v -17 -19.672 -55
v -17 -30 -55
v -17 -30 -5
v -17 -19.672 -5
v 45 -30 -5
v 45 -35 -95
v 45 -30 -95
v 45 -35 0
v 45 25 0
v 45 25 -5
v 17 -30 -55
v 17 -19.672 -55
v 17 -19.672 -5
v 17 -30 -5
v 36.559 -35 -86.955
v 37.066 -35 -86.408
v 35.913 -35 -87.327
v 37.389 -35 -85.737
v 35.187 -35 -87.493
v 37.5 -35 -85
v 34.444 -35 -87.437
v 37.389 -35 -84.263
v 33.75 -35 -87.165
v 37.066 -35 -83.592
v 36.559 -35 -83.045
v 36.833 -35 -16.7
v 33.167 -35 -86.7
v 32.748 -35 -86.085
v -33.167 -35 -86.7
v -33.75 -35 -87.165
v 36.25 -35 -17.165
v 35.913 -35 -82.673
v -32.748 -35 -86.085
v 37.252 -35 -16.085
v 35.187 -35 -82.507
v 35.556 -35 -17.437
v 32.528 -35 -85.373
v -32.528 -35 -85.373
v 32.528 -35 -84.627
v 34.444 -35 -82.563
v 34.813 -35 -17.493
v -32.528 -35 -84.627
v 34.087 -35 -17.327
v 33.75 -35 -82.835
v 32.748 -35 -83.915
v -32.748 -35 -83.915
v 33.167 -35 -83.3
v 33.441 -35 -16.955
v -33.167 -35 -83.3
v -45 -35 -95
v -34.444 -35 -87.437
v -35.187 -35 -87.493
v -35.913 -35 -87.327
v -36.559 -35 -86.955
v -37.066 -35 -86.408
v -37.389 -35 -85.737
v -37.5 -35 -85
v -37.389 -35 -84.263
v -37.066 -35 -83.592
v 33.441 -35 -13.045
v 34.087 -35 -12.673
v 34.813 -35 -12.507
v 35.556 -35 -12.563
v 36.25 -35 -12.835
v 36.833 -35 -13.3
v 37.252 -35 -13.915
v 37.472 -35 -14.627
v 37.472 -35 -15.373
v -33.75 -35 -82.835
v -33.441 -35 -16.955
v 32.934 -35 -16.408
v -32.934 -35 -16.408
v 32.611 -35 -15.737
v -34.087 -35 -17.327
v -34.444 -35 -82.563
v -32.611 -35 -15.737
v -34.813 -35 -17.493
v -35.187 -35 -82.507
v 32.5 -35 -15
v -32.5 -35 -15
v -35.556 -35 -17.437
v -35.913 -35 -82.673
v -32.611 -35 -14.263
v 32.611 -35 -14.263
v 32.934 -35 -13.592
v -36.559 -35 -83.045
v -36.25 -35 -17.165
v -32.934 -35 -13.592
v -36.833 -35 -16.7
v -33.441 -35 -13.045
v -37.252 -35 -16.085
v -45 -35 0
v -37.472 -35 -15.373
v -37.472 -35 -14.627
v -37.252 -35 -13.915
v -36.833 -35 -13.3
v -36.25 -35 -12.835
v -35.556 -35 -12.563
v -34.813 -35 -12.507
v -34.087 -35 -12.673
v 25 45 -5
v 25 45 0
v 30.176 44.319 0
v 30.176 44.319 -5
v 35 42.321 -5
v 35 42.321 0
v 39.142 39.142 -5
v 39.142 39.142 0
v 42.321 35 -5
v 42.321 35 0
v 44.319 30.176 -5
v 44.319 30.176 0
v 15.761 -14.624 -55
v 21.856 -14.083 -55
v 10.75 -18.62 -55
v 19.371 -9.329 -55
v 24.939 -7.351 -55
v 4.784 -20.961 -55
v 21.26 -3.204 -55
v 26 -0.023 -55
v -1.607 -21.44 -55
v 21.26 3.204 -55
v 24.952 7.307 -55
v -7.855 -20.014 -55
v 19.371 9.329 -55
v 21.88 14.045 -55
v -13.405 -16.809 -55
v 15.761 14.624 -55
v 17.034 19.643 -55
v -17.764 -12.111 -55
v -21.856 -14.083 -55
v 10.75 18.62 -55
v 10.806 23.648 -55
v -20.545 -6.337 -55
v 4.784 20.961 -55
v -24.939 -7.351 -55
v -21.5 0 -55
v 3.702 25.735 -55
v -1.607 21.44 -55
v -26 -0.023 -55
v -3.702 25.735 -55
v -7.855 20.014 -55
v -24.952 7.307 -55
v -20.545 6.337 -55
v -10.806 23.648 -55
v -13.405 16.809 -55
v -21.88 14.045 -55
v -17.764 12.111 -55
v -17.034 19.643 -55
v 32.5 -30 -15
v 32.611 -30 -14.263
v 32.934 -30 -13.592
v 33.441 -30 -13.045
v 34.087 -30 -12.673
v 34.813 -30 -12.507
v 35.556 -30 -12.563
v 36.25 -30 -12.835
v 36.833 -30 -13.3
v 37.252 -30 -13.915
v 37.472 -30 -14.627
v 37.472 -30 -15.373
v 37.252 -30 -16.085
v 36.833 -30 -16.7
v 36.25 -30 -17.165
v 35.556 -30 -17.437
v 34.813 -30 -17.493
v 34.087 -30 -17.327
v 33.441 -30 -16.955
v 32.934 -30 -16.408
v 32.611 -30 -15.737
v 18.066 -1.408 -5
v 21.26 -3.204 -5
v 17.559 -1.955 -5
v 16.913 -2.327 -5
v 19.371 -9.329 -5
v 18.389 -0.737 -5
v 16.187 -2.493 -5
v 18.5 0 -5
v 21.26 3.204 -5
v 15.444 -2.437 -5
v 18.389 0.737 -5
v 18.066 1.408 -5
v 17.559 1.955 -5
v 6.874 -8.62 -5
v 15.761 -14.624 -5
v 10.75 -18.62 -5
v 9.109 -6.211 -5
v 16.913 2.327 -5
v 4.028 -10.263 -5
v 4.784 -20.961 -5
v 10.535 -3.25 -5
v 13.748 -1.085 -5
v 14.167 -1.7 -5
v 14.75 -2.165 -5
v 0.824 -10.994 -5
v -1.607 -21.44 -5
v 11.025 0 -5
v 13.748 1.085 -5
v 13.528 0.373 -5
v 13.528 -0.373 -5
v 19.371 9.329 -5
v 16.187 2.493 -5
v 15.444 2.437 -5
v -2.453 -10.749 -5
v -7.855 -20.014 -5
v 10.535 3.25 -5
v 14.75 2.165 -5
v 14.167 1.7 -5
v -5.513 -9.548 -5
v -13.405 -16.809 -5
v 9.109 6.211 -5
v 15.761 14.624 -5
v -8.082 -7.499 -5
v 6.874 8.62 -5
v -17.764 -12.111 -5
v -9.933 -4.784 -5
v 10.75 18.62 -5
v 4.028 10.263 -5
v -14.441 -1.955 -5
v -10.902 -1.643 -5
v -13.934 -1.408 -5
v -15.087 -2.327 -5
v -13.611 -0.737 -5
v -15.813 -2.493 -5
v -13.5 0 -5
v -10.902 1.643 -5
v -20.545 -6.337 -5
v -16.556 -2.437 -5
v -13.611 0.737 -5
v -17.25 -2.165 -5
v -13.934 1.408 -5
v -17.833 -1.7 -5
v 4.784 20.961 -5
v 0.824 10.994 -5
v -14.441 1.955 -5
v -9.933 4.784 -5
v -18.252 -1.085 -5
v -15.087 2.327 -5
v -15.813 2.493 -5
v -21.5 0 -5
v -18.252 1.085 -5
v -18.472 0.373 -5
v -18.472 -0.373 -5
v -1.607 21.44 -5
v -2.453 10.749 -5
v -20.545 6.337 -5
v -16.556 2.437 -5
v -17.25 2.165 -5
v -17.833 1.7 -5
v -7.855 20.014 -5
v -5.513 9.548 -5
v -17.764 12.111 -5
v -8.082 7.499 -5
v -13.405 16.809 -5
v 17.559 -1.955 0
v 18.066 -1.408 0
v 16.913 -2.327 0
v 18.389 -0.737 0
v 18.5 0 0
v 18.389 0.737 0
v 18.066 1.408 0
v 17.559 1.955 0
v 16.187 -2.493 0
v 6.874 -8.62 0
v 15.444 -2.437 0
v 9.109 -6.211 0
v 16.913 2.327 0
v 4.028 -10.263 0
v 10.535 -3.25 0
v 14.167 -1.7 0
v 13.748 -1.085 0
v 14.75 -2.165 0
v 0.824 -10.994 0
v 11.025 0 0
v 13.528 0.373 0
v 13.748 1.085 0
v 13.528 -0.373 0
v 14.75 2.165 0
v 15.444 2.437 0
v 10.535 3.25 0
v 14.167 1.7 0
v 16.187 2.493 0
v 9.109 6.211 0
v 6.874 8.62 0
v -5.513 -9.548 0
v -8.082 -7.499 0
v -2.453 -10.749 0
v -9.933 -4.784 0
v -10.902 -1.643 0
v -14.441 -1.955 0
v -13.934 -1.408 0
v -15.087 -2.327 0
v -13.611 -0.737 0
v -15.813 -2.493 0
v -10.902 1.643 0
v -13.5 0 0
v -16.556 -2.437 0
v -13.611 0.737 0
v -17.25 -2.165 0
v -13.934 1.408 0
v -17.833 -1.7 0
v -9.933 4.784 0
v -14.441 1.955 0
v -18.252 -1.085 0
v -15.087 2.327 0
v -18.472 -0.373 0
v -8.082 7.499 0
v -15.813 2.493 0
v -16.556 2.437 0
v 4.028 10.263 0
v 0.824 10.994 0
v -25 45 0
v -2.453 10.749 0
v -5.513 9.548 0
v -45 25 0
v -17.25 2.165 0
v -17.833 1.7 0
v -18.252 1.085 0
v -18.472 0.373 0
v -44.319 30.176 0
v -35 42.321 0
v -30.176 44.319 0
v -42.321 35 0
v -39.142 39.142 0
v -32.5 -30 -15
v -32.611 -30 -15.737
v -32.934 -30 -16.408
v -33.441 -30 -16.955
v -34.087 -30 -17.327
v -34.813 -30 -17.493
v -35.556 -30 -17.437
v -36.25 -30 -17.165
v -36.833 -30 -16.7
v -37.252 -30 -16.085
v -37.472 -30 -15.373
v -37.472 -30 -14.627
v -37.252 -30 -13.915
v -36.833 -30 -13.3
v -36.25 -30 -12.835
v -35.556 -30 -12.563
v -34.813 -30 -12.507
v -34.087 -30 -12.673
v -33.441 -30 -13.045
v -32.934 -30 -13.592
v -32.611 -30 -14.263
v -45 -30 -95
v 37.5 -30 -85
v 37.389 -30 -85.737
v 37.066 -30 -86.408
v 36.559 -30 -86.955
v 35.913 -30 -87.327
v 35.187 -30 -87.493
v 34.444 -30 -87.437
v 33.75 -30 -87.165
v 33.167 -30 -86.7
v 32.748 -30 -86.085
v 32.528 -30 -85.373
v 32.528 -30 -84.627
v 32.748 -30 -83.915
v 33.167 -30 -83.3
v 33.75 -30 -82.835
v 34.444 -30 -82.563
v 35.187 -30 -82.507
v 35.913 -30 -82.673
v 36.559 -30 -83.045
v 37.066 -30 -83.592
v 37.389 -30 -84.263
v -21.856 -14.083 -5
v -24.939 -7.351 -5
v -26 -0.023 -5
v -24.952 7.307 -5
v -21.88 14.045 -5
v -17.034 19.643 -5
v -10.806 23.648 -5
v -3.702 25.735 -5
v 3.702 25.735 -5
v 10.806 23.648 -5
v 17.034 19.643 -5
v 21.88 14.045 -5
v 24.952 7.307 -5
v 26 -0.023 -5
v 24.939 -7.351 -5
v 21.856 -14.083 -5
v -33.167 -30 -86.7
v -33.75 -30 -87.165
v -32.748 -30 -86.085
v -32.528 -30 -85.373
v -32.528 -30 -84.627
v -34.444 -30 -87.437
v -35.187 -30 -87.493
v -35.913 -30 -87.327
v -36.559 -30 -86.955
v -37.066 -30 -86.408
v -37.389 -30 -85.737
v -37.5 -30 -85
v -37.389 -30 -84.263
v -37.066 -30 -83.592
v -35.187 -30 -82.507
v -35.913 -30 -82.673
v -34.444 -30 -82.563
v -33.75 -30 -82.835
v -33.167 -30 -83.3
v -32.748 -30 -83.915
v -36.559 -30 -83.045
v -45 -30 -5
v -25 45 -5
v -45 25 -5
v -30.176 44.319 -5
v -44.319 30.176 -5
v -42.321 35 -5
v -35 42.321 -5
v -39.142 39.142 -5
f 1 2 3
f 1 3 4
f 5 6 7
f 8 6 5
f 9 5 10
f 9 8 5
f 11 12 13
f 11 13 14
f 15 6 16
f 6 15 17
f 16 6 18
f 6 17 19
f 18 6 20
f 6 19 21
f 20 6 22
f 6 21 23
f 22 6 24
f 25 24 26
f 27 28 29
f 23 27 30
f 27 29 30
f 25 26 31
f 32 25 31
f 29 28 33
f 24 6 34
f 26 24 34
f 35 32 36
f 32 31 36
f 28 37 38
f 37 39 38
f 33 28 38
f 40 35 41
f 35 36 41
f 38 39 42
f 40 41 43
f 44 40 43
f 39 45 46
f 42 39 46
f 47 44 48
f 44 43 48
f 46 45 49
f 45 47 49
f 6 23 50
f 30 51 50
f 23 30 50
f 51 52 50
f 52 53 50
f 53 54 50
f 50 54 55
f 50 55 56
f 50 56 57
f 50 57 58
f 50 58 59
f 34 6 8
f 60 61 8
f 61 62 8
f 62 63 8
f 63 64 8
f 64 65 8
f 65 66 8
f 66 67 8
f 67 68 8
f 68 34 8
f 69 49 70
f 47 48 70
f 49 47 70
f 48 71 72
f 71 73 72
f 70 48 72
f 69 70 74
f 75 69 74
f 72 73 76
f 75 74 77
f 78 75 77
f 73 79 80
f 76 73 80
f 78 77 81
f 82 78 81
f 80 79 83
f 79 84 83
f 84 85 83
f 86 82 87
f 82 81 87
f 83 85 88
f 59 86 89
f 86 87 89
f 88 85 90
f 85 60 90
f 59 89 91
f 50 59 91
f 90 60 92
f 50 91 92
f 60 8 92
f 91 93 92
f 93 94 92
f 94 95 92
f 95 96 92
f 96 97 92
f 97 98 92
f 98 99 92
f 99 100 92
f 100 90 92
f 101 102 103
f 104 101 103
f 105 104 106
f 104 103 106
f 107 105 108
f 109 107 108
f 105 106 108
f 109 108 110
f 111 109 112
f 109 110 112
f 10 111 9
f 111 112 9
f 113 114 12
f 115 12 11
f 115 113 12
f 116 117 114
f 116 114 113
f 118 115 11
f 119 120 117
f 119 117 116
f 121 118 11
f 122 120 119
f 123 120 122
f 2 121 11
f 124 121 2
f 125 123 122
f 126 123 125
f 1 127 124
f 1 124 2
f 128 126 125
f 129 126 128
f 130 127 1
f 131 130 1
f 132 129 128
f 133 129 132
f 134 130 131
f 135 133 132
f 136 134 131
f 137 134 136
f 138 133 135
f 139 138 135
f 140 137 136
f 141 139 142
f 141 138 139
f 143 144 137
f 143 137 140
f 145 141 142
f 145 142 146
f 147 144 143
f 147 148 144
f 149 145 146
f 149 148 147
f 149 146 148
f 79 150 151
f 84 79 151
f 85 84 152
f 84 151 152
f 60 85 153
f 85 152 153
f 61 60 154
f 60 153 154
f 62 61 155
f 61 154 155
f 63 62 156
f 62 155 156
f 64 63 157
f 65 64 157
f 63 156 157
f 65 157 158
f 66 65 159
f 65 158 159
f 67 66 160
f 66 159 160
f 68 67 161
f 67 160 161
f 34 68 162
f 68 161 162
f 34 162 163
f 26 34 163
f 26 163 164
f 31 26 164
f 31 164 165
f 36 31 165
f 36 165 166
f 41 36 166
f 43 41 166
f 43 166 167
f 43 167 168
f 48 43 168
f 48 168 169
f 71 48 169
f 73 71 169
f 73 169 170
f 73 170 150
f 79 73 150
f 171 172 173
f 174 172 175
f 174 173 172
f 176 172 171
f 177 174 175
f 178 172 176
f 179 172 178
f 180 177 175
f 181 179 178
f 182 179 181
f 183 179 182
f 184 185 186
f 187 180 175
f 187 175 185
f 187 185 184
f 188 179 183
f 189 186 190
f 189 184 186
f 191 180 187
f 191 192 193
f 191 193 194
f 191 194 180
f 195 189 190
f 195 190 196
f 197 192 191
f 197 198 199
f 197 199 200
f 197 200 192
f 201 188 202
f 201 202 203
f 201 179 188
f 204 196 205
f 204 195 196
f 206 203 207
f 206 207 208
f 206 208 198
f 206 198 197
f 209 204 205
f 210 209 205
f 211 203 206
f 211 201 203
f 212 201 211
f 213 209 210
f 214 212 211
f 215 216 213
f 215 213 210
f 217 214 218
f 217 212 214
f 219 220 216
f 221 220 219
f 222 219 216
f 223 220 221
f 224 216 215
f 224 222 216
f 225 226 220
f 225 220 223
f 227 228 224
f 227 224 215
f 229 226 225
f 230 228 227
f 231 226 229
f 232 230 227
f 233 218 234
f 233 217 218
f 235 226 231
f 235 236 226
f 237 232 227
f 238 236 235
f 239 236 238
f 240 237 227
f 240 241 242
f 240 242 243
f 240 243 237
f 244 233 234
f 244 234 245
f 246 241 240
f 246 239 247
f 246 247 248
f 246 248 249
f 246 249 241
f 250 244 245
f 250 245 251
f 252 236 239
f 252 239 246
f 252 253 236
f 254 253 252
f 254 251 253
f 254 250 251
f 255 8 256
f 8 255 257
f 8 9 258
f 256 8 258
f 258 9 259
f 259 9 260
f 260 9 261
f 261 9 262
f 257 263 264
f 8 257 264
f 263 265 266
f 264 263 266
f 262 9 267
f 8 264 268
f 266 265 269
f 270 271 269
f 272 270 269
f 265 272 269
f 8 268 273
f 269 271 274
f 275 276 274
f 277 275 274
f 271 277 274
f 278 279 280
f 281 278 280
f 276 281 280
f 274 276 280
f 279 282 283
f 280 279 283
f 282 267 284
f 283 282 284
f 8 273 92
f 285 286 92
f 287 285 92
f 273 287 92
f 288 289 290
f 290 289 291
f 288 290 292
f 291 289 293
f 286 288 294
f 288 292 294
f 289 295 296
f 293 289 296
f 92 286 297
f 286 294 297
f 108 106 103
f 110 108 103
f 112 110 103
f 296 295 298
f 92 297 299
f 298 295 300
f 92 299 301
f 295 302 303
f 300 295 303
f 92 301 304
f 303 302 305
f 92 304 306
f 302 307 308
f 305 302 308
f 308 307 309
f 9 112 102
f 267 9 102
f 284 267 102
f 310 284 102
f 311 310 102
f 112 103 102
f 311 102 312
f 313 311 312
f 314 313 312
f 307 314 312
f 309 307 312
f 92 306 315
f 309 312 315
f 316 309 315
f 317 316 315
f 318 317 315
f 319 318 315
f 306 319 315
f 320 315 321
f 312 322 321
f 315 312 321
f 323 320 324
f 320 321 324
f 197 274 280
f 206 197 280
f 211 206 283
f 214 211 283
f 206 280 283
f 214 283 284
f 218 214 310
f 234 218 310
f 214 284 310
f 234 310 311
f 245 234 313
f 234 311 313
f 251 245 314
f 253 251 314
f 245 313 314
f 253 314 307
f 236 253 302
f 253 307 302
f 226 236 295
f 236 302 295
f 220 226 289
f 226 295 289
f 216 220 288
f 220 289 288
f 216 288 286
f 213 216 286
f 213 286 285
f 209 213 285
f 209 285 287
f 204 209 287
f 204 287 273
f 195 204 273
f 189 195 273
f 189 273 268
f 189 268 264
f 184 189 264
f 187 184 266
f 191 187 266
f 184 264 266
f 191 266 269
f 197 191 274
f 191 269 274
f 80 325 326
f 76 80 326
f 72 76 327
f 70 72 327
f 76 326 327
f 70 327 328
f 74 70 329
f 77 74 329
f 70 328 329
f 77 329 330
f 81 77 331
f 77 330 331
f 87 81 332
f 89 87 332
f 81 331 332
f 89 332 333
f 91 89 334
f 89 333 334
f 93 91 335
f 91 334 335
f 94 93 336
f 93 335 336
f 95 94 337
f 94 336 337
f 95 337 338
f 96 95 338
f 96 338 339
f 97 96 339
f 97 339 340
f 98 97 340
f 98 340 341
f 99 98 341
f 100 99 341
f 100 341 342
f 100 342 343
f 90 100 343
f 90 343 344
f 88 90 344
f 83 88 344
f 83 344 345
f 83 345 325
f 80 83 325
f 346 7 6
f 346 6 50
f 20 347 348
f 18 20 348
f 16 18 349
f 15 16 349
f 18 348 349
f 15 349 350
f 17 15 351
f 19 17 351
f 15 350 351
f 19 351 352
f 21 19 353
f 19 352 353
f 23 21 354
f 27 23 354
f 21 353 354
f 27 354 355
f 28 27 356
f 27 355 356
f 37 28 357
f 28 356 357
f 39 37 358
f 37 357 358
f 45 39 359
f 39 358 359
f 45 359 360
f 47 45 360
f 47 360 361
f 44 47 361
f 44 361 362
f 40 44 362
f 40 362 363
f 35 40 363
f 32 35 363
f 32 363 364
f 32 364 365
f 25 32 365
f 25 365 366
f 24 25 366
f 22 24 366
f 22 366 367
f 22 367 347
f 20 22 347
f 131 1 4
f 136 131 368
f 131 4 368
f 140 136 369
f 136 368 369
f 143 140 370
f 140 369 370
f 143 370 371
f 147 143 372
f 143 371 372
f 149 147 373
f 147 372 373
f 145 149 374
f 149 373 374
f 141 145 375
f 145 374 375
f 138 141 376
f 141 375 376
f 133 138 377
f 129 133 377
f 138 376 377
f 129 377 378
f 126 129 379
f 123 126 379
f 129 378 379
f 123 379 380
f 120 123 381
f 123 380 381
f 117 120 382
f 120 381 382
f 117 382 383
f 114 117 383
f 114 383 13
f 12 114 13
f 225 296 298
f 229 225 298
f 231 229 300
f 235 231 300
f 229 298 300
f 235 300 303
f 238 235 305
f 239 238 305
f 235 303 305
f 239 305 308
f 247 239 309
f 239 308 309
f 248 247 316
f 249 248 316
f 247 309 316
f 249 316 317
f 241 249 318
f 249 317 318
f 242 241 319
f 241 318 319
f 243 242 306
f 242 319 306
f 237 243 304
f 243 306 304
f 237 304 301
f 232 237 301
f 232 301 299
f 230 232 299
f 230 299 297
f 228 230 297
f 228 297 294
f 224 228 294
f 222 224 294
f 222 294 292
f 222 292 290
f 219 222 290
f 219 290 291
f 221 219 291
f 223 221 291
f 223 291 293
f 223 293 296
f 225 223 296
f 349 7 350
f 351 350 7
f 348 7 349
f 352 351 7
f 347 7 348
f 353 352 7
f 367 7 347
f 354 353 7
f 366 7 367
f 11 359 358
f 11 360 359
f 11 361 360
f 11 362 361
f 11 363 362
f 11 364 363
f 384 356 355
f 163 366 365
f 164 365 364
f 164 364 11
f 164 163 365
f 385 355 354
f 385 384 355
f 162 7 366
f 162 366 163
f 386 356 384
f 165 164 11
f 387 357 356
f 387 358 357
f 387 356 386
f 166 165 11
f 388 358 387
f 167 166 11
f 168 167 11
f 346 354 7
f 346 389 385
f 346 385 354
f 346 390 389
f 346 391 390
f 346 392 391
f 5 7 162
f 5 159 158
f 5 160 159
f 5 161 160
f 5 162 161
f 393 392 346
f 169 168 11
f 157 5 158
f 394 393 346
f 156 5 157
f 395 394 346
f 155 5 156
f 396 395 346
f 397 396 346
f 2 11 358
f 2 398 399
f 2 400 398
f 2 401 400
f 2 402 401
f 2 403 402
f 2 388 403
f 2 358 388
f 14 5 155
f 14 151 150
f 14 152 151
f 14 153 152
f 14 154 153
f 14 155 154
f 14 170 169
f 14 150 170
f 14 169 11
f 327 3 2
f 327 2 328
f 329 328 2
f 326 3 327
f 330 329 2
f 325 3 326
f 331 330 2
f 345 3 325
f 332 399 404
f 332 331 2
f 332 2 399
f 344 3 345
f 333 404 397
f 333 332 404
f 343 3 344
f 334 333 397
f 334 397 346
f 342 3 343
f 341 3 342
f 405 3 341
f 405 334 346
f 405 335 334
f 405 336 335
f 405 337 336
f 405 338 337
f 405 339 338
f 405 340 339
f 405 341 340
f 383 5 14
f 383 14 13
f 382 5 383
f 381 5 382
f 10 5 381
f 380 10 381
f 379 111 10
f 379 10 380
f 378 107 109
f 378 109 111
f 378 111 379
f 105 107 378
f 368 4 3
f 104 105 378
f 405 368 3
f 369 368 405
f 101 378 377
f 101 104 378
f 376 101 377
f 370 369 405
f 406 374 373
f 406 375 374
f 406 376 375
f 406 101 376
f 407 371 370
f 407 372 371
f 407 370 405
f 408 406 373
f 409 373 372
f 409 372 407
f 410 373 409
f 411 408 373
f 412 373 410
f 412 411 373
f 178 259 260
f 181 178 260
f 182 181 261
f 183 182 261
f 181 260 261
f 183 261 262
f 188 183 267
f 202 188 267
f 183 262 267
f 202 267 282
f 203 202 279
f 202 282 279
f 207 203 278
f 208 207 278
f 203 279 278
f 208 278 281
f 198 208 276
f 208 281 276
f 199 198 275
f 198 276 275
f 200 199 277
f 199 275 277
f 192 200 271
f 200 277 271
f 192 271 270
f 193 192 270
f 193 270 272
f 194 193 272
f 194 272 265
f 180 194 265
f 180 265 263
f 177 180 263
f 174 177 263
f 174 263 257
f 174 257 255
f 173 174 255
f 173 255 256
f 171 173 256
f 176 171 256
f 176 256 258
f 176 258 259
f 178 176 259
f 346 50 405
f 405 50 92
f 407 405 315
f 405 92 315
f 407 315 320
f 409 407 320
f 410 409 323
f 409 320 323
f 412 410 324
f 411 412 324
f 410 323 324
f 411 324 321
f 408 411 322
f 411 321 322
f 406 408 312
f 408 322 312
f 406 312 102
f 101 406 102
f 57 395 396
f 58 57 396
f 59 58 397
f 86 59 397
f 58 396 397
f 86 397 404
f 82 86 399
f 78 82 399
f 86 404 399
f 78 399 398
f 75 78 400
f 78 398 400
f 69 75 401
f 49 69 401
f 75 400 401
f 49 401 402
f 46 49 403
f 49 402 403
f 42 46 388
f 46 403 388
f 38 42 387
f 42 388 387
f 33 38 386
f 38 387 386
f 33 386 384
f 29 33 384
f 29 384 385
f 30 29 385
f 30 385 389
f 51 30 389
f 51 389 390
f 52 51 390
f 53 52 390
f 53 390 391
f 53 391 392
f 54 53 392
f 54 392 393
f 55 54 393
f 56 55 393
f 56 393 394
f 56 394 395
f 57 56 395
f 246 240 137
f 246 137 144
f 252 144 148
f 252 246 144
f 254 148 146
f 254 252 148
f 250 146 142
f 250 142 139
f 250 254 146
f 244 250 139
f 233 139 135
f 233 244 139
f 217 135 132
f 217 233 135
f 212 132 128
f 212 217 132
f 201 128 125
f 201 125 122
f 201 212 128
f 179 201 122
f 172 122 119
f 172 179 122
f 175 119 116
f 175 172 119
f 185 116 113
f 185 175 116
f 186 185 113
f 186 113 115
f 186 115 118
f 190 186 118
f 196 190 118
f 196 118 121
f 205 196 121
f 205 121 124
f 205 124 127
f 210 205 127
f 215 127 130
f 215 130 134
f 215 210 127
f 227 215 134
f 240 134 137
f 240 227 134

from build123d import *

# Parameters (mm, degrees)
CROQUIS1_R              = 11.025
SALIENTE_EXTRUIR1_DEPTH = 5
CROQUIS2_W              = 90
CROQUIS2_H              = 5
SALIENTE_EXTRUIR2_DEPTH = 90
CROQUIS3_R              = 21.5
SALIENTE_EXTRUIR3_DEPTH = 50
CROQUIS4_R              = 2.5
CORTAR_EXTRUIR1_DEPTH   = 70
CROQUIS5_R              = 2.5
CORTAR_EXTRUIR2_DEPTH   = 130.131715701


with BuildPart() as part:
    # Croquis1 → Saliente-Extruir1 (new body)
    with BuildSketch(Plane.XY):
        with BuildLine():
            Line((45, -2.305306559), (45, -35))
            Line((45, -35), (-45, -35))
            Line((-45, -35), (-45, 25))
            ThreePointArc((-45, 25), (-39.142135624, 39.142135624), (-25, 45))
            Line((-25, 45), (25, 45))
            ThreePointArc((25, 45), (39.142135624, 39.142135624), (45, 25))
            Line((45, 25), (45, -2.305306559))
        make_face()
        Circle(CROQUIS1_R, mode=Mode.SUBTRACT)
    extrude(amount=-SALIENTE_EXTRUIR1_DEPTH)

    # Croquis2 → Saliente-Extruir2 (add)
    with BuildSketch(Plane(origin=(0, 0, -5), x_dir=(-1, 0, 0), z_dir=(0, 0, -1))):
        with Locations((0, -32.5)):
            Rectangle(CROQUIS2_W, CROQUIS2_H)
    extrude(amount=SALIENTE_EXTRUIR2_DEPTH)

    # Croquis3 → Saliente-Extruir3 (add)
    with BuildSketch(Plane(origin=(0, 0, -5), x_dir=(-1, 0, 0), z_dir=(0, 0, -1))):
        with BuildLine():
            Line((17, -30), (17, -19.672315573))
            ThreePointArc((17, -19.672315573), (0, 26), (-17, -19.672315573))
            Line((-17, -19.672315573), (-17, -30))
            Line((-17, -30), (17, -30))
        make_face()
        Circle(CROQUIS3_R, mode=Mode.SUBTRACT)
    extrude(amount=SALIENTE_EXTRUIR3_DEPTH)

    # Croquis4 → Cortar-Extruir1 (cut)
    with BuildSketch(Plane.XY):
        with Locations((-16, 0)):
            Circle(CROQUIS4_R)
        with Locations((16, 0)):
            Circle(CROQUIS4_R)
    extrude(amount=-CORTAR_EXTRUIR1_DEPTH, mode=Mode.SUBTRACT)

    # Croquis5 → Cortar-Extruir2 (cut, through all)
    with BuildSketch(Plane(origin=(0, -30, 0), x_dir=(1, 0, 0), z_dir=(0, 1, 0))):
        with Locations(Location((-35, 85, 0), (0, 0, 180))):
            Circle(CROQUIS5_R)
        with Locations((35, 85)):
            Circle(CROQUIS5_R)
        with Locations(Location((35, 15, 0), (0, 0, 180))):
            Circle(CROQUIS5_R)
        with Locations((-35, 15)):
            Circle(CROQUIS5_R)
    extrude(amount=-CORTAR_EXTRUIR2_DEPTH, mode=Mode.SUBTRACT)


solid = part.part
